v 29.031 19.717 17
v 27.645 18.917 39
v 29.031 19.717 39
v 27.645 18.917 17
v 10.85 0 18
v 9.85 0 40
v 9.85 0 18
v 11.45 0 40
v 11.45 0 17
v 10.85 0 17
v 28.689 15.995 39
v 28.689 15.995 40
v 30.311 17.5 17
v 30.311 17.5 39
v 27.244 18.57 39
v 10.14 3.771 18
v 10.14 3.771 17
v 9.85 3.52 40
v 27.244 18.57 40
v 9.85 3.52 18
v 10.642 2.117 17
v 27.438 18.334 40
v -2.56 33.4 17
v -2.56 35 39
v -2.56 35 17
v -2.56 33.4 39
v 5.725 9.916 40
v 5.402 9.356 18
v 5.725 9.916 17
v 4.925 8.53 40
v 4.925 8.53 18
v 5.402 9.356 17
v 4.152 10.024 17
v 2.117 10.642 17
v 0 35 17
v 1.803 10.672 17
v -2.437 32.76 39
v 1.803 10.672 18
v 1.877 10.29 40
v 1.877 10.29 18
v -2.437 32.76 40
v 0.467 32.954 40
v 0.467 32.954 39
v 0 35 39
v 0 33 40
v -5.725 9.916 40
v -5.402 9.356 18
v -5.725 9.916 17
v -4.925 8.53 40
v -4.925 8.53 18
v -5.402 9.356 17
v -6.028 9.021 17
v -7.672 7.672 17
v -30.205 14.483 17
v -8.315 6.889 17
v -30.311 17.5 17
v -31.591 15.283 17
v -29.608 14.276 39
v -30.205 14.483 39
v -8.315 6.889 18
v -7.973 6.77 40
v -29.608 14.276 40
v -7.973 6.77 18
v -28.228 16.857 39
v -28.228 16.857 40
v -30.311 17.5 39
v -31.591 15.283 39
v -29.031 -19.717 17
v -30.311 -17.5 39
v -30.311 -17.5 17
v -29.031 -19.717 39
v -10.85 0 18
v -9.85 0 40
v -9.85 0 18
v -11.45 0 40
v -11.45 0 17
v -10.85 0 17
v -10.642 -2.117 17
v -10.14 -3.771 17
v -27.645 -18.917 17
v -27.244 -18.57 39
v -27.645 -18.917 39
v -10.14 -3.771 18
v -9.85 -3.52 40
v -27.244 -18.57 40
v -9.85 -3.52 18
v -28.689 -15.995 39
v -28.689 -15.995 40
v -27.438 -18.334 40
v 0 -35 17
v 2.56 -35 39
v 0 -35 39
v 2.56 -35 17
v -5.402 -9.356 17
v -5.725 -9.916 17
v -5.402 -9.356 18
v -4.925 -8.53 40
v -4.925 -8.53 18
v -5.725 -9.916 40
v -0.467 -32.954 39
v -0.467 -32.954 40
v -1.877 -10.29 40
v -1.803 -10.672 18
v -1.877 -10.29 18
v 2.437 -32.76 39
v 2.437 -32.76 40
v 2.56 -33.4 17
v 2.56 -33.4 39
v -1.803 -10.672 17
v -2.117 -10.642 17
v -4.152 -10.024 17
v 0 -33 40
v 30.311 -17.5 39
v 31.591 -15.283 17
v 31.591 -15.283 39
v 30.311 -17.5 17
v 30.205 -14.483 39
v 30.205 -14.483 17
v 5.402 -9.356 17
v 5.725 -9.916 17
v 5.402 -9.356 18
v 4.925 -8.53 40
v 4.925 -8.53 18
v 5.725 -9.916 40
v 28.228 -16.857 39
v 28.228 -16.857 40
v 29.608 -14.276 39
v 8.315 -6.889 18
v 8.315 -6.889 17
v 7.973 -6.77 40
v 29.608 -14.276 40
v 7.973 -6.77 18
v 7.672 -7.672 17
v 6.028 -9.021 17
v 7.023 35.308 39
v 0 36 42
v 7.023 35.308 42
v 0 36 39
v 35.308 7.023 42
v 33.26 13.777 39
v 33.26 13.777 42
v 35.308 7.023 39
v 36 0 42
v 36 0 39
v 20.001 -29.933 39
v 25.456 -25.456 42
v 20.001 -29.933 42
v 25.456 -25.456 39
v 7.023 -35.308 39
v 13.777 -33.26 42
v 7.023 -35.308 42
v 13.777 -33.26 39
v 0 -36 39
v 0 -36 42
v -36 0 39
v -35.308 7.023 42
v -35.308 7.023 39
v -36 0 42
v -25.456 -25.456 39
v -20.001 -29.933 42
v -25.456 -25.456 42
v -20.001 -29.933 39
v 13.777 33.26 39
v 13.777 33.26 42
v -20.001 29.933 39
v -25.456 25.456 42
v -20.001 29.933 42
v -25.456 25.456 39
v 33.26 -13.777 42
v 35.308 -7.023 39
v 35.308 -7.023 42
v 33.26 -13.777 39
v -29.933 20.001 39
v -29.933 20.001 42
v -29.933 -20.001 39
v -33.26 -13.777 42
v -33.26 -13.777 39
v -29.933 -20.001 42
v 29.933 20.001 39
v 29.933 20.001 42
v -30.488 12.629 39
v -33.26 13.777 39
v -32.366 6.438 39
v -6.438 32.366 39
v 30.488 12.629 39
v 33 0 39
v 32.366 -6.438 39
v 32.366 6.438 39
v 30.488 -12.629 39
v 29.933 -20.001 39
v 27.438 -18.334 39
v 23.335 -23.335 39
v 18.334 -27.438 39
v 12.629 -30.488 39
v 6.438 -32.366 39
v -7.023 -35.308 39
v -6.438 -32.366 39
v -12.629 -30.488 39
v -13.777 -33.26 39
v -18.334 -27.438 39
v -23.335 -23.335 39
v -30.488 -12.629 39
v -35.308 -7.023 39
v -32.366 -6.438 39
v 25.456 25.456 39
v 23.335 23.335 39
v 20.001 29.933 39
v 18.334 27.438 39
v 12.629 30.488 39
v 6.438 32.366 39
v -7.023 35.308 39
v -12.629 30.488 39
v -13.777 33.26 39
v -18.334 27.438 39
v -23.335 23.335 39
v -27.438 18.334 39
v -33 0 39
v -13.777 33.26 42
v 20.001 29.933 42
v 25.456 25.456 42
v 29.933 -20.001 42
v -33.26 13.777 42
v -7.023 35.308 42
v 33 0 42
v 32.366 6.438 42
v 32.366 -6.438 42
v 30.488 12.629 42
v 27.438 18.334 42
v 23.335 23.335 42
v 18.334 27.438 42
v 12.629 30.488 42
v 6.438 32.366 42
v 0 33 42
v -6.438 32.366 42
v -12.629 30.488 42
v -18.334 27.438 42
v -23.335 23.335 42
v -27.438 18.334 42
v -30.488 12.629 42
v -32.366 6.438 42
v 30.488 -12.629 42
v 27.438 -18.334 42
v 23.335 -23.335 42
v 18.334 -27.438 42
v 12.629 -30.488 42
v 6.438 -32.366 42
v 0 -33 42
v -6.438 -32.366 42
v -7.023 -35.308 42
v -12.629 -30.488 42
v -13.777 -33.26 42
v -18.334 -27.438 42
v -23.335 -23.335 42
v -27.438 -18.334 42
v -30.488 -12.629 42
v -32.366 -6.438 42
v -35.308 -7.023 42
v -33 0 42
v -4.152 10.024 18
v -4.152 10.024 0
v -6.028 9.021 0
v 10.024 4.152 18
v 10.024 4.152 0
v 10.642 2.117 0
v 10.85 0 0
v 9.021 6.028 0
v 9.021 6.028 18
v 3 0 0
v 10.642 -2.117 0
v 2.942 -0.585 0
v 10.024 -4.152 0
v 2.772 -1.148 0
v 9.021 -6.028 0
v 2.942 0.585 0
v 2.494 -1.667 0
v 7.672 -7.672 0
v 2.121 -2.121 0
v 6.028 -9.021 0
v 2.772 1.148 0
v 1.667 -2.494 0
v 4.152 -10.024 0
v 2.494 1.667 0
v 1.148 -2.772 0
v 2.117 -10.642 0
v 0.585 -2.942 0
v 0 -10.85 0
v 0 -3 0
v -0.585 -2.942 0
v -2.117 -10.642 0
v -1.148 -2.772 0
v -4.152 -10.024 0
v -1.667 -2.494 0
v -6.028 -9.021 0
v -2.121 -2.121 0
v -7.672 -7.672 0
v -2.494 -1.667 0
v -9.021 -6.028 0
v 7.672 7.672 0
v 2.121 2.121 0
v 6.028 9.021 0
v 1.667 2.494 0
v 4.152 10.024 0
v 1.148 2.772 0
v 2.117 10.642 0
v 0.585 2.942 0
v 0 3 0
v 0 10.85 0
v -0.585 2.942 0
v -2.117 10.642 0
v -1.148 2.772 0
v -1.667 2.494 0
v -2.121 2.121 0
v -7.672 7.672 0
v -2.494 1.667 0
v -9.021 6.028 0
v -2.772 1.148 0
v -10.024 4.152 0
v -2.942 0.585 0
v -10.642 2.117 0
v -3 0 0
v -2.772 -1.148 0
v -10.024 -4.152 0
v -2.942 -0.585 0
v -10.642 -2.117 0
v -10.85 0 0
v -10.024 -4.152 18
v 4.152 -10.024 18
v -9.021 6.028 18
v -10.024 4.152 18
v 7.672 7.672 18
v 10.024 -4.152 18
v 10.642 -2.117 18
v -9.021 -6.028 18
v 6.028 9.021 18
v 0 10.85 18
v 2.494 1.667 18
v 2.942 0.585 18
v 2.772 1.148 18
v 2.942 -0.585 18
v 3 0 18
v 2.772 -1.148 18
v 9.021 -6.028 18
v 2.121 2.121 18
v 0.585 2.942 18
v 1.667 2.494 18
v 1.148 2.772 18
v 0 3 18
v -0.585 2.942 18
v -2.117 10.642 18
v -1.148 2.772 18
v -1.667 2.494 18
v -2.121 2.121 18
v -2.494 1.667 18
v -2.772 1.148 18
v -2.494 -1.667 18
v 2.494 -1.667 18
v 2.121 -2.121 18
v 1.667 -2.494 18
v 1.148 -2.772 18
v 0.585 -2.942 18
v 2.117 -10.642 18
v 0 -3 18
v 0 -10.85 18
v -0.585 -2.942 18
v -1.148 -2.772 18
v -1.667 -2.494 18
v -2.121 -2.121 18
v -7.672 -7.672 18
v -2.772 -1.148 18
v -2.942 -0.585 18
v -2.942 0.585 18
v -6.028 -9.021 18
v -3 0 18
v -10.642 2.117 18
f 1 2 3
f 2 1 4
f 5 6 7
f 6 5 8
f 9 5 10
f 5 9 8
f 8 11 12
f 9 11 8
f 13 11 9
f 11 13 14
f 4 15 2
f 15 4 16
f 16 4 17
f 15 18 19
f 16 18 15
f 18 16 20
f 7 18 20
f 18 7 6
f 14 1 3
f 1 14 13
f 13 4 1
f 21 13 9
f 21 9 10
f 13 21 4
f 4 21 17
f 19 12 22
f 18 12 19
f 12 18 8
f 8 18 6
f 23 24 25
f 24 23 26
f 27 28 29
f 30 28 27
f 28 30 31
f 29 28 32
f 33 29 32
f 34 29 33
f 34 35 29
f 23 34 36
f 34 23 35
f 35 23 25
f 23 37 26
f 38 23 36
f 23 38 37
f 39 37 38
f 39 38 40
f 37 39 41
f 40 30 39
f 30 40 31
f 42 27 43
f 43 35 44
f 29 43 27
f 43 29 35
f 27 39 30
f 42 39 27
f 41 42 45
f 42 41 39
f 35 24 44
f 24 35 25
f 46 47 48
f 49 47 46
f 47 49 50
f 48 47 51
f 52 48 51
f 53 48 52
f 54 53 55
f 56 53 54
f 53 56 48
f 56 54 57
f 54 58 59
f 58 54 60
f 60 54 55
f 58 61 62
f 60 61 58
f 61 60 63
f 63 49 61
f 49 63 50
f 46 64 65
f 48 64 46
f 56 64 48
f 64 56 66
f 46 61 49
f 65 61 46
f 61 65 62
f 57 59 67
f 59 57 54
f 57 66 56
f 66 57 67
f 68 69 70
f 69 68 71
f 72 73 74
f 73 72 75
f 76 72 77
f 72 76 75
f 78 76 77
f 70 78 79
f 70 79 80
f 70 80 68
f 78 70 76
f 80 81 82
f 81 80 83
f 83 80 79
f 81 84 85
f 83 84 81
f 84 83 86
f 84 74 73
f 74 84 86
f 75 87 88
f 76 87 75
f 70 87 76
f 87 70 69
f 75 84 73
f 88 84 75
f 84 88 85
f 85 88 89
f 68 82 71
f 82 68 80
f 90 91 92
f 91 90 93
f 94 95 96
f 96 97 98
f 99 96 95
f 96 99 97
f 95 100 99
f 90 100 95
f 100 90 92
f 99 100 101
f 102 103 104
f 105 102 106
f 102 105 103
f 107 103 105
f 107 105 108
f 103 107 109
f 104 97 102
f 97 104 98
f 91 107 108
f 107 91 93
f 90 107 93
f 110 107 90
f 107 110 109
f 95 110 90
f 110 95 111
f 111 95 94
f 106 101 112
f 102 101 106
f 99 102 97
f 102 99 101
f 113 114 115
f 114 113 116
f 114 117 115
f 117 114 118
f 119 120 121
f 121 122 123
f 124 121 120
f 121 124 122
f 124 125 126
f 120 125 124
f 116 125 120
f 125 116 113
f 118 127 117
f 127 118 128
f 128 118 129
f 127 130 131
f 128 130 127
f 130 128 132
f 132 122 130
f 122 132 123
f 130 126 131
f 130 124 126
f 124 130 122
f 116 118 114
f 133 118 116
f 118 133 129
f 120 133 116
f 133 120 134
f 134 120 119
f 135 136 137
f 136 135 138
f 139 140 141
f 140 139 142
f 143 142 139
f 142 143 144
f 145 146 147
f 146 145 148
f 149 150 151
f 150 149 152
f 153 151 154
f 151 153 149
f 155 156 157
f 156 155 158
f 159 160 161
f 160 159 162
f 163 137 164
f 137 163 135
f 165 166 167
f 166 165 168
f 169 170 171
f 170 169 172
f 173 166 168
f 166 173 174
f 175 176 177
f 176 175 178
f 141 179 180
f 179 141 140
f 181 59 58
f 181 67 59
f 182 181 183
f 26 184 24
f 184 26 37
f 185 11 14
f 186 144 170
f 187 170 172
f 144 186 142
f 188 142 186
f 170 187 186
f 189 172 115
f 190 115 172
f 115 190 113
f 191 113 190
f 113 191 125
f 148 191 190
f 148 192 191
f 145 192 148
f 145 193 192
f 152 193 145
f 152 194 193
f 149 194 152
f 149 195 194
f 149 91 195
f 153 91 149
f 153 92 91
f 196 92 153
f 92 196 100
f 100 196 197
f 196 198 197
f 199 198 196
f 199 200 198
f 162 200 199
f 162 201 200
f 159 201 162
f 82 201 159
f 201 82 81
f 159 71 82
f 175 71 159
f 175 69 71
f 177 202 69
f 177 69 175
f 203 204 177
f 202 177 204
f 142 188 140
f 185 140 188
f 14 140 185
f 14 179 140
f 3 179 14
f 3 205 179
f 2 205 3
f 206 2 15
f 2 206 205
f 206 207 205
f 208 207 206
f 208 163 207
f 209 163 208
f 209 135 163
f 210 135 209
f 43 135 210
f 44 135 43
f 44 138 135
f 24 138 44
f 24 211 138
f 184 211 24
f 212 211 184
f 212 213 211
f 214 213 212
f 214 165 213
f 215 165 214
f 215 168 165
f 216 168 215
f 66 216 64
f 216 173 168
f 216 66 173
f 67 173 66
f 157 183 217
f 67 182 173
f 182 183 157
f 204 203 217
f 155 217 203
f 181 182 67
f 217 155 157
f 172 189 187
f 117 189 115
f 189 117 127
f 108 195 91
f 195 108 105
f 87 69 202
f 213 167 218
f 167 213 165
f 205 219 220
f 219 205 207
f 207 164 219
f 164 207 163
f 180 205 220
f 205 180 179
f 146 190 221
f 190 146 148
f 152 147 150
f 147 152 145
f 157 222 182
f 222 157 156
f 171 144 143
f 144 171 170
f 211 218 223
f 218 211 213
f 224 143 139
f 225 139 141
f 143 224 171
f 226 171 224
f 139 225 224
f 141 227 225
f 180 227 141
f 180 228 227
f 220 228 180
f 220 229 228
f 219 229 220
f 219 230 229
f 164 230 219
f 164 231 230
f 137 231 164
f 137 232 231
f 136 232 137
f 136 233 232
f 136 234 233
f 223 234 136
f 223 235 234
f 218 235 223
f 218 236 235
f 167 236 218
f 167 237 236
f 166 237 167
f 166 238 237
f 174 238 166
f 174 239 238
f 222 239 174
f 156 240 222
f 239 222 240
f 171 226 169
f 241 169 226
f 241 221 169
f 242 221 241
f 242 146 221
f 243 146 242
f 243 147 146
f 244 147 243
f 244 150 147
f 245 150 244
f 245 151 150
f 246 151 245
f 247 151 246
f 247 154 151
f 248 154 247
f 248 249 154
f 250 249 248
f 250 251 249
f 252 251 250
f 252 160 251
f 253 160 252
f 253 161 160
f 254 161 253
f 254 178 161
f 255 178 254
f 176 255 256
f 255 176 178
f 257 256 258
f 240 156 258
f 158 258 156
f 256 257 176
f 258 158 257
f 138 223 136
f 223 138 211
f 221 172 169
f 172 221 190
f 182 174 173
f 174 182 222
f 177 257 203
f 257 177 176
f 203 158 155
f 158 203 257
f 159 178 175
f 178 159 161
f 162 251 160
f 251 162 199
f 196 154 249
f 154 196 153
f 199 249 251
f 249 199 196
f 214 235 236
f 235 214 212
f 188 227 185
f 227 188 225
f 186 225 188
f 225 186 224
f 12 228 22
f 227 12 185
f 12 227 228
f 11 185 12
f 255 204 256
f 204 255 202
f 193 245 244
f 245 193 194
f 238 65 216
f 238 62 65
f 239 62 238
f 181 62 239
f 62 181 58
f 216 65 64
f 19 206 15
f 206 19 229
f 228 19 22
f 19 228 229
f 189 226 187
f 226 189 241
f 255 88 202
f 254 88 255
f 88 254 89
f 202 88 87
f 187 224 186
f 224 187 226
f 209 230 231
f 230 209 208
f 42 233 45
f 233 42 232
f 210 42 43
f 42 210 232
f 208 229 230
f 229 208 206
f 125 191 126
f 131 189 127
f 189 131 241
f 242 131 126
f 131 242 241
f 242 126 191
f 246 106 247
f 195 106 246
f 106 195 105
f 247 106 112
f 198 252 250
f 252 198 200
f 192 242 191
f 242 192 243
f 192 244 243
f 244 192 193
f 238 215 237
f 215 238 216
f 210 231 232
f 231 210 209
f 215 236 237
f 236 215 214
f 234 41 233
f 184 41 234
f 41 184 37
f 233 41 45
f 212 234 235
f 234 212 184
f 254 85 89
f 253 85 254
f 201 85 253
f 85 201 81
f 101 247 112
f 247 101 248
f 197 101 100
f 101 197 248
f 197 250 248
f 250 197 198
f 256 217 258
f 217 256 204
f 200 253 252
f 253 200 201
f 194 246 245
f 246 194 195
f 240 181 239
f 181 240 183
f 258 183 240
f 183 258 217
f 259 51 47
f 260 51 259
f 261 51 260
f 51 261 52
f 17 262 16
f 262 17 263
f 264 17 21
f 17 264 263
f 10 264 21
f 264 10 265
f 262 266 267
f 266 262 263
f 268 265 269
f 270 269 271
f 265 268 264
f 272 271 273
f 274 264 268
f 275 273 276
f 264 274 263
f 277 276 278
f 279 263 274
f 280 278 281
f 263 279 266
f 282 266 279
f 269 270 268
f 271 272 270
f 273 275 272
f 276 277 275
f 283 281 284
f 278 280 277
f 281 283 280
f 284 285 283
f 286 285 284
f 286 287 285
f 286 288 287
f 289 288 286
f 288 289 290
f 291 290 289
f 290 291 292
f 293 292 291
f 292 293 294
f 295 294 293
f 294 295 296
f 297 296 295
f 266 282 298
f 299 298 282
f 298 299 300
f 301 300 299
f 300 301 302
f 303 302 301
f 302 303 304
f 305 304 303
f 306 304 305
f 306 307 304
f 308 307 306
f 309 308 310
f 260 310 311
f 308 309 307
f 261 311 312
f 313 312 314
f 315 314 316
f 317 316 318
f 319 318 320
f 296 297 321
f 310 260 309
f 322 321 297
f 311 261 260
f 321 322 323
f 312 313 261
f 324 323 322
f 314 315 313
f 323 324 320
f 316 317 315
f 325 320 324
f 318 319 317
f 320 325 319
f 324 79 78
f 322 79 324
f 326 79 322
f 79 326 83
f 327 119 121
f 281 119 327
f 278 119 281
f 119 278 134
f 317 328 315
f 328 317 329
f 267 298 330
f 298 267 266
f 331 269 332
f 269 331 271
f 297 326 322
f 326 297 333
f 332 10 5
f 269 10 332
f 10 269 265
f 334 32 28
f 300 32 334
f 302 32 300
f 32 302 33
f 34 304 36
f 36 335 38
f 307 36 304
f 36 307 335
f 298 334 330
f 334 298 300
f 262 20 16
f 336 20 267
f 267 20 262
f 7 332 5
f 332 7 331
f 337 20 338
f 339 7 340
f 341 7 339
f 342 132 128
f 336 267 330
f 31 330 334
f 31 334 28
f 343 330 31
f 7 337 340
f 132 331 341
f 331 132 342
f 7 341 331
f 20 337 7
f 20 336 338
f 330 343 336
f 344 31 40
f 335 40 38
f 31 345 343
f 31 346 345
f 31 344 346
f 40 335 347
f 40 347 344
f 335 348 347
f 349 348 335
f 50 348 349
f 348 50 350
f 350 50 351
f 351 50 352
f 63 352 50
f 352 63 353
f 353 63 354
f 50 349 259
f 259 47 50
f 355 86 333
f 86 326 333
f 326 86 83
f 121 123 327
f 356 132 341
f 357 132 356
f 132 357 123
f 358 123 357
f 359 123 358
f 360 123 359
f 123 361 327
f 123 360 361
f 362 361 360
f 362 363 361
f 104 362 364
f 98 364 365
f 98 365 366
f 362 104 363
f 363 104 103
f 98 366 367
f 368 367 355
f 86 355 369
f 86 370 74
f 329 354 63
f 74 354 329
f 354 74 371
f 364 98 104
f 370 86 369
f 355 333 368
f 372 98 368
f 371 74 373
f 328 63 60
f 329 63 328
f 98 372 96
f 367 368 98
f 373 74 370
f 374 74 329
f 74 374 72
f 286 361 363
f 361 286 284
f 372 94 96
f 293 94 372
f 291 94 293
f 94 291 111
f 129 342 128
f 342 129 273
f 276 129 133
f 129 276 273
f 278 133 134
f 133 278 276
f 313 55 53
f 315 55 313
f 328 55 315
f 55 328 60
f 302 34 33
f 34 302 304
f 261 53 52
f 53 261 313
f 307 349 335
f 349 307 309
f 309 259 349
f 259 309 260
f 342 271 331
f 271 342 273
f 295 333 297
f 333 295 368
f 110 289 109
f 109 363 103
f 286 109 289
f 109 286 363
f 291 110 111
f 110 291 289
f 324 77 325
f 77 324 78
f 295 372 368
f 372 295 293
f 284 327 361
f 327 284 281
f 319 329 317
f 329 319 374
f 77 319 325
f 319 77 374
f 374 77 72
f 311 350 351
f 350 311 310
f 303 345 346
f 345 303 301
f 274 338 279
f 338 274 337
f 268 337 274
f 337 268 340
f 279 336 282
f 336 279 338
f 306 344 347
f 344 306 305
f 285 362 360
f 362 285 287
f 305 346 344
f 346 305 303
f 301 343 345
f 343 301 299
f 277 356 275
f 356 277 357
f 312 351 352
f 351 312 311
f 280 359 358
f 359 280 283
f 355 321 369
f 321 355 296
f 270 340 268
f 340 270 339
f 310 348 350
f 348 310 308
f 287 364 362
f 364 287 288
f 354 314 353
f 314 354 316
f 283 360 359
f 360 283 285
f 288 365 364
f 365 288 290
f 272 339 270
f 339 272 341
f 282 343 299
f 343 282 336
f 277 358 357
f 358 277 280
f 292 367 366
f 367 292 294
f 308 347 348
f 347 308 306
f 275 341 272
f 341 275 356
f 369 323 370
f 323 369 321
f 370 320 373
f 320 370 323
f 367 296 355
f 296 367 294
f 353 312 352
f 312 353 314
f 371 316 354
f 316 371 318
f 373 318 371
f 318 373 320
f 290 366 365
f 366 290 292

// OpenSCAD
$fn = 32;

// ----------------------------------------------------------------------
// Impeller: 70 mm, 6 blades, 42 mm tall
// ----------------------------------------------------------------------

// --- parameters (mm) ---
hub_d = 21.7;             // hub diameter
hub_h = 18;               // hub height
imp_d = 70;               // outer diameter over the blades
blades = 6;               // number of blades
blade_t = 1.6;            // blade thickness
blade_h = 22;             // blade height
blade_in_r = 9.85;        // blade root radius
blade_out_r = 33.4;       // blade tip radius
sweep = 30;               // blade sweep, degrees
bore_d = 6;               // shaft bore
shroud_h = 2;             // shroud ring thickness
shroud_d = 72;            // shroud outside diameter

module hub() {
  cylinder(h = hub_h, d = hub_d);
}

module blade() {
  /* blade swept between two boxes: hull of the root and the tip section */
  hull() {
    translate([blade_in_r, 0, hub_h - 1])
      cube([blade_t, blade_t * 2.2, blade_h + 1], center = false);
    rotate([0, 0, sweep])
      translate([blade_out_r, 0, hub_h - 1])
        cube([blade_t, blade_t * 1.6, blade_h + 1], center = false);
  }
}

module blades() {
  for (i = [0 : blades - 1])
    rotate([0, 0, i * 360 / blades]) blade();
}

module shroud() {
  translate([0, 0, hub_h + blade_h - 1])
    difference() {
      cylinder(h = shroud_h + 1, d = shroud_d);
      translate([0, 0, -1]) cylinder(h = shroud_h + 3, d = shroud_d - 2 * 3);
    }
}

difference() {
  union() {
    hub();
    blades();
    shroud();
  }
  translate([0, 0, -1]) cylinder(h = hub_h + blade_h + shroud_h + 3, d = bore_d);
}
